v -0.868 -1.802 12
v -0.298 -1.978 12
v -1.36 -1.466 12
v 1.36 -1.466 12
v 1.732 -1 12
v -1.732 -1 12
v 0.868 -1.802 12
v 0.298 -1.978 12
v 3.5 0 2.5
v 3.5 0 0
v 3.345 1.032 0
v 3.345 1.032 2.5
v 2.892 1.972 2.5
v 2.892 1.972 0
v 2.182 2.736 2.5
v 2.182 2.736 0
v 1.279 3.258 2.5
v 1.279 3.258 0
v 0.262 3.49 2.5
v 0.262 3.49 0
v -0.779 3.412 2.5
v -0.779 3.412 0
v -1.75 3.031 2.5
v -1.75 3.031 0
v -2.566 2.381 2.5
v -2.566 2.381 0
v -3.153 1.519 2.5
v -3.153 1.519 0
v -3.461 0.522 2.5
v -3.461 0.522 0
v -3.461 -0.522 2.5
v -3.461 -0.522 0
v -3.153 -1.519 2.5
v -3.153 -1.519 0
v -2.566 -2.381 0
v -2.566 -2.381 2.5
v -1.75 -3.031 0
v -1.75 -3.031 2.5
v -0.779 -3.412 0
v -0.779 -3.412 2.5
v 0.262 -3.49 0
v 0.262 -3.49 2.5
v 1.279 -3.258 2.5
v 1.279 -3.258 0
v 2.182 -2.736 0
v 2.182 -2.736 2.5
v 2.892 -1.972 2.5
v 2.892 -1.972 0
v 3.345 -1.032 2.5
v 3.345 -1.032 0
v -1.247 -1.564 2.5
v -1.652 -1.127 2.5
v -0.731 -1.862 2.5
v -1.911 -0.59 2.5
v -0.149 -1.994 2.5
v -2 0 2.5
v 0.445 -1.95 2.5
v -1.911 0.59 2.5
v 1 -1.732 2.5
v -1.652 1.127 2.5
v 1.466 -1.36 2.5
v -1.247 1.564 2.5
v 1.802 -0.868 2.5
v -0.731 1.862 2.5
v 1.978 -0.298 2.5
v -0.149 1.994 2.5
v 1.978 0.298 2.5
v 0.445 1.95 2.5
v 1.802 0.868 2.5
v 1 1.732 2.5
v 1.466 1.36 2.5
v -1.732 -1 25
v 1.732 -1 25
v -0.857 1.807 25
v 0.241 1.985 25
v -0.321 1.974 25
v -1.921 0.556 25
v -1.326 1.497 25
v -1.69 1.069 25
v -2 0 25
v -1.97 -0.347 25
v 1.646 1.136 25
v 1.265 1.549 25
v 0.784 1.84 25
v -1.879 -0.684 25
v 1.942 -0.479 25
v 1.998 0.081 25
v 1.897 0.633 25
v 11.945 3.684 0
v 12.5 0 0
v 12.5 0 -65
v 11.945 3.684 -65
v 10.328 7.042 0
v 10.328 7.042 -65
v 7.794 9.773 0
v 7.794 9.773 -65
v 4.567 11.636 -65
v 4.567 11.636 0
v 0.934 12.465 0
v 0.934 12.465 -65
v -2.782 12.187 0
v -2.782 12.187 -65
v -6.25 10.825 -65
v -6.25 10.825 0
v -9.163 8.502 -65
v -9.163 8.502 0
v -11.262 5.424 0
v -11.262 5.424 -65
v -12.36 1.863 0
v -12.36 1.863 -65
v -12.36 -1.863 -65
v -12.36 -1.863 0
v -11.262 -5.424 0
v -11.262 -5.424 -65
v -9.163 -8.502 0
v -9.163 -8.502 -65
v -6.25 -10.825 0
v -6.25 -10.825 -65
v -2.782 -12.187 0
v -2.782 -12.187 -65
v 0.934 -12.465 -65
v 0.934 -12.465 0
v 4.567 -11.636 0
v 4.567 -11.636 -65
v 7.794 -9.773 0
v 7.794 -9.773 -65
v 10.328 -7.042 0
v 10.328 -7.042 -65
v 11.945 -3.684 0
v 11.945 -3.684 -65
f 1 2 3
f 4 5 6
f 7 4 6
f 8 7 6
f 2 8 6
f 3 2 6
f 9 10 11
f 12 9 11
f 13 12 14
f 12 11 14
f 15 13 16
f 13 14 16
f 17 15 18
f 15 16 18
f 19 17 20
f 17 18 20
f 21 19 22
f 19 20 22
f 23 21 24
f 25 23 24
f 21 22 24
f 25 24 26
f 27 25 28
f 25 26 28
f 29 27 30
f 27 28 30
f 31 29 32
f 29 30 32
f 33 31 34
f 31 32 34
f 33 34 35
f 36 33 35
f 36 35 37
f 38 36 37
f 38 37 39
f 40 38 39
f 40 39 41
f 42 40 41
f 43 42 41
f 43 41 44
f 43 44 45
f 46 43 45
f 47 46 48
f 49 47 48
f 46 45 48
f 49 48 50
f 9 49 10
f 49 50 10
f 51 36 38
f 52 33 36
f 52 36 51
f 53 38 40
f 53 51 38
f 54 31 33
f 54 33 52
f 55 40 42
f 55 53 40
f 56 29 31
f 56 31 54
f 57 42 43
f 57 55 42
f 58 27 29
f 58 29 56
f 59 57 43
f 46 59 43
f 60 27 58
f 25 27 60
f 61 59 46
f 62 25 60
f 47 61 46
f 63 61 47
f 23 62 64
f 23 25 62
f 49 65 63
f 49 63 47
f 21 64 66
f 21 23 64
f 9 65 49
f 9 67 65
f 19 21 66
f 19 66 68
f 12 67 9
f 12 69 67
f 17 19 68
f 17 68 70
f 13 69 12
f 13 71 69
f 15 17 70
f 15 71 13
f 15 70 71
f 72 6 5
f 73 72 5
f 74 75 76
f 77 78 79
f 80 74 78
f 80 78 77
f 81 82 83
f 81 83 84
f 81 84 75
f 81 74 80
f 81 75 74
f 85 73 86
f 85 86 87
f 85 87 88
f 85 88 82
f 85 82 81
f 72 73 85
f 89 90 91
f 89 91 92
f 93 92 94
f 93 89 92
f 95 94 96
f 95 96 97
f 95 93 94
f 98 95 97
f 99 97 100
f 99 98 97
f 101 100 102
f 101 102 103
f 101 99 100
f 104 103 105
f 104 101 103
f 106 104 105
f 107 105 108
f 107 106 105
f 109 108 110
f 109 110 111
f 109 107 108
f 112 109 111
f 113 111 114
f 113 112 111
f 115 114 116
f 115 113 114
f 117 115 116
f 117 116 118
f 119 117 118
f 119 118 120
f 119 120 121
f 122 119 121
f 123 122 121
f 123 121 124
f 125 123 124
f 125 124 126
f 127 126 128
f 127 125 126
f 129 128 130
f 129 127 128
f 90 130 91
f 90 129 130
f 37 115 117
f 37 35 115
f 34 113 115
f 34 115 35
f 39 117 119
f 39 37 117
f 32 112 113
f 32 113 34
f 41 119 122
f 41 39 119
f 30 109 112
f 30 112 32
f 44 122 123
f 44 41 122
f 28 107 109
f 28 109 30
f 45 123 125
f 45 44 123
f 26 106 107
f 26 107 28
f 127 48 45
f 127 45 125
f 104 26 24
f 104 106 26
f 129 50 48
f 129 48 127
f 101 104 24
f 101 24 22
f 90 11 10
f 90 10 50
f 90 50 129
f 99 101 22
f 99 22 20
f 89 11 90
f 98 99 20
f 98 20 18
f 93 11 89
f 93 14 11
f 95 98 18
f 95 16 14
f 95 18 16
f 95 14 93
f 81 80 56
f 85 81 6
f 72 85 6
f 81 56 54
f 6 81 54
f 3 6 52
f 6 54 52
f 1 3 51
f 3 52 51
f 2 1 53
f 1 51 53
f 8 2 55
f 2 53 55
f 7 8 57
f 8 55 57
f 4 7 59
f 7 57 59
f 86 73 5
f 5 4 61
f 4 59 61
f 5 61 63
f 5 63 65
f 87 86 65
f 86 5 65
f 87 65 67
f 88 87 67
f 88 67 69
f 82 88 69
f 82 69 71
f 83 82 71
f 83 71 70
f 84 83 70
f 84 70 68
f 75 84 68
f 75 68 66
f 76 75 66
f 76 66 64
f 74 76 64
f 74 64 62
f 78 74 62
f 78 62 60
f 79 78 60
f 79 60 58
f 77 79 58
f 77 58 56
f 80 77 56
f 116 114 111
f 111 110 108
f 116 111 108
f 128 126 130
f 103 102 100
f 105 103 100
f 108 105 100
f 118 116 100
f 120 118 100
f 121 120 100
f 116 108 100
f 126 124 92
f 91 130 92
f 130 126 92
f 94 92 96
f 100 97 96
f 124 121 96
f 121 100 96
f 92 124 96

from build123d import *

# Parameters (mm, degrees)
ESQUISSE1_R             = 12.5
BOSS_EXTRU_1_DEPTH      = 65
ESQUISSE2_R             = 3.5
BOSS_EXTRU_2_DEPTH      = 2.5
ESQUISSE3_R             = 2
BOSS_EXTRU_3_DEPTH      = 22.5
ENL_V_START             = -13
ENL_V_MAT_EXTRU_1_DEPTH = 13


with BuildPart() as part:
    # Esquisse1 → Boss.-Extru.1 (new body)
    with BuildSketch(Plane.XY):
        Circle(ESQUISSE1_R)
    extrude(amount=-BOSS_EXTRU_1_DEPTH)

    # Esquisse2 → Boss.-Extru.2 (add)
    with BuildSketch(Plane.XY):
        Circle(ESQUISSE2_R)
    extrude(amount=BOSS_EXTRU_2_DEPTH)

    # Esquisse3 → Boss.-Extru.3 (add)
    with BuildSketch(Plane.XY.offset(2.5)):
        Circle(ESQUISSE3_R)
    extrude(amount=BOSS_EXTRU_3_DEPTH)

    # Esquisse4 → Enlèv. mat.-Extru.1 (cut)
    with BuildSketch(Plane.XY.offset(25).offset(ENL_V_START)):
        with BuildLine():
            Line((-1.732050808, -1), (1.732050808, -1))
            ThreePointArc((1.732050808, -1), (0, -2), (-1.732050808, -1))
        make_face()
    extrude(amount=ENL_V_MAT_EXTRU_1_DEPTH, mode=Mode.SUBTRACT)


solid = part.part
